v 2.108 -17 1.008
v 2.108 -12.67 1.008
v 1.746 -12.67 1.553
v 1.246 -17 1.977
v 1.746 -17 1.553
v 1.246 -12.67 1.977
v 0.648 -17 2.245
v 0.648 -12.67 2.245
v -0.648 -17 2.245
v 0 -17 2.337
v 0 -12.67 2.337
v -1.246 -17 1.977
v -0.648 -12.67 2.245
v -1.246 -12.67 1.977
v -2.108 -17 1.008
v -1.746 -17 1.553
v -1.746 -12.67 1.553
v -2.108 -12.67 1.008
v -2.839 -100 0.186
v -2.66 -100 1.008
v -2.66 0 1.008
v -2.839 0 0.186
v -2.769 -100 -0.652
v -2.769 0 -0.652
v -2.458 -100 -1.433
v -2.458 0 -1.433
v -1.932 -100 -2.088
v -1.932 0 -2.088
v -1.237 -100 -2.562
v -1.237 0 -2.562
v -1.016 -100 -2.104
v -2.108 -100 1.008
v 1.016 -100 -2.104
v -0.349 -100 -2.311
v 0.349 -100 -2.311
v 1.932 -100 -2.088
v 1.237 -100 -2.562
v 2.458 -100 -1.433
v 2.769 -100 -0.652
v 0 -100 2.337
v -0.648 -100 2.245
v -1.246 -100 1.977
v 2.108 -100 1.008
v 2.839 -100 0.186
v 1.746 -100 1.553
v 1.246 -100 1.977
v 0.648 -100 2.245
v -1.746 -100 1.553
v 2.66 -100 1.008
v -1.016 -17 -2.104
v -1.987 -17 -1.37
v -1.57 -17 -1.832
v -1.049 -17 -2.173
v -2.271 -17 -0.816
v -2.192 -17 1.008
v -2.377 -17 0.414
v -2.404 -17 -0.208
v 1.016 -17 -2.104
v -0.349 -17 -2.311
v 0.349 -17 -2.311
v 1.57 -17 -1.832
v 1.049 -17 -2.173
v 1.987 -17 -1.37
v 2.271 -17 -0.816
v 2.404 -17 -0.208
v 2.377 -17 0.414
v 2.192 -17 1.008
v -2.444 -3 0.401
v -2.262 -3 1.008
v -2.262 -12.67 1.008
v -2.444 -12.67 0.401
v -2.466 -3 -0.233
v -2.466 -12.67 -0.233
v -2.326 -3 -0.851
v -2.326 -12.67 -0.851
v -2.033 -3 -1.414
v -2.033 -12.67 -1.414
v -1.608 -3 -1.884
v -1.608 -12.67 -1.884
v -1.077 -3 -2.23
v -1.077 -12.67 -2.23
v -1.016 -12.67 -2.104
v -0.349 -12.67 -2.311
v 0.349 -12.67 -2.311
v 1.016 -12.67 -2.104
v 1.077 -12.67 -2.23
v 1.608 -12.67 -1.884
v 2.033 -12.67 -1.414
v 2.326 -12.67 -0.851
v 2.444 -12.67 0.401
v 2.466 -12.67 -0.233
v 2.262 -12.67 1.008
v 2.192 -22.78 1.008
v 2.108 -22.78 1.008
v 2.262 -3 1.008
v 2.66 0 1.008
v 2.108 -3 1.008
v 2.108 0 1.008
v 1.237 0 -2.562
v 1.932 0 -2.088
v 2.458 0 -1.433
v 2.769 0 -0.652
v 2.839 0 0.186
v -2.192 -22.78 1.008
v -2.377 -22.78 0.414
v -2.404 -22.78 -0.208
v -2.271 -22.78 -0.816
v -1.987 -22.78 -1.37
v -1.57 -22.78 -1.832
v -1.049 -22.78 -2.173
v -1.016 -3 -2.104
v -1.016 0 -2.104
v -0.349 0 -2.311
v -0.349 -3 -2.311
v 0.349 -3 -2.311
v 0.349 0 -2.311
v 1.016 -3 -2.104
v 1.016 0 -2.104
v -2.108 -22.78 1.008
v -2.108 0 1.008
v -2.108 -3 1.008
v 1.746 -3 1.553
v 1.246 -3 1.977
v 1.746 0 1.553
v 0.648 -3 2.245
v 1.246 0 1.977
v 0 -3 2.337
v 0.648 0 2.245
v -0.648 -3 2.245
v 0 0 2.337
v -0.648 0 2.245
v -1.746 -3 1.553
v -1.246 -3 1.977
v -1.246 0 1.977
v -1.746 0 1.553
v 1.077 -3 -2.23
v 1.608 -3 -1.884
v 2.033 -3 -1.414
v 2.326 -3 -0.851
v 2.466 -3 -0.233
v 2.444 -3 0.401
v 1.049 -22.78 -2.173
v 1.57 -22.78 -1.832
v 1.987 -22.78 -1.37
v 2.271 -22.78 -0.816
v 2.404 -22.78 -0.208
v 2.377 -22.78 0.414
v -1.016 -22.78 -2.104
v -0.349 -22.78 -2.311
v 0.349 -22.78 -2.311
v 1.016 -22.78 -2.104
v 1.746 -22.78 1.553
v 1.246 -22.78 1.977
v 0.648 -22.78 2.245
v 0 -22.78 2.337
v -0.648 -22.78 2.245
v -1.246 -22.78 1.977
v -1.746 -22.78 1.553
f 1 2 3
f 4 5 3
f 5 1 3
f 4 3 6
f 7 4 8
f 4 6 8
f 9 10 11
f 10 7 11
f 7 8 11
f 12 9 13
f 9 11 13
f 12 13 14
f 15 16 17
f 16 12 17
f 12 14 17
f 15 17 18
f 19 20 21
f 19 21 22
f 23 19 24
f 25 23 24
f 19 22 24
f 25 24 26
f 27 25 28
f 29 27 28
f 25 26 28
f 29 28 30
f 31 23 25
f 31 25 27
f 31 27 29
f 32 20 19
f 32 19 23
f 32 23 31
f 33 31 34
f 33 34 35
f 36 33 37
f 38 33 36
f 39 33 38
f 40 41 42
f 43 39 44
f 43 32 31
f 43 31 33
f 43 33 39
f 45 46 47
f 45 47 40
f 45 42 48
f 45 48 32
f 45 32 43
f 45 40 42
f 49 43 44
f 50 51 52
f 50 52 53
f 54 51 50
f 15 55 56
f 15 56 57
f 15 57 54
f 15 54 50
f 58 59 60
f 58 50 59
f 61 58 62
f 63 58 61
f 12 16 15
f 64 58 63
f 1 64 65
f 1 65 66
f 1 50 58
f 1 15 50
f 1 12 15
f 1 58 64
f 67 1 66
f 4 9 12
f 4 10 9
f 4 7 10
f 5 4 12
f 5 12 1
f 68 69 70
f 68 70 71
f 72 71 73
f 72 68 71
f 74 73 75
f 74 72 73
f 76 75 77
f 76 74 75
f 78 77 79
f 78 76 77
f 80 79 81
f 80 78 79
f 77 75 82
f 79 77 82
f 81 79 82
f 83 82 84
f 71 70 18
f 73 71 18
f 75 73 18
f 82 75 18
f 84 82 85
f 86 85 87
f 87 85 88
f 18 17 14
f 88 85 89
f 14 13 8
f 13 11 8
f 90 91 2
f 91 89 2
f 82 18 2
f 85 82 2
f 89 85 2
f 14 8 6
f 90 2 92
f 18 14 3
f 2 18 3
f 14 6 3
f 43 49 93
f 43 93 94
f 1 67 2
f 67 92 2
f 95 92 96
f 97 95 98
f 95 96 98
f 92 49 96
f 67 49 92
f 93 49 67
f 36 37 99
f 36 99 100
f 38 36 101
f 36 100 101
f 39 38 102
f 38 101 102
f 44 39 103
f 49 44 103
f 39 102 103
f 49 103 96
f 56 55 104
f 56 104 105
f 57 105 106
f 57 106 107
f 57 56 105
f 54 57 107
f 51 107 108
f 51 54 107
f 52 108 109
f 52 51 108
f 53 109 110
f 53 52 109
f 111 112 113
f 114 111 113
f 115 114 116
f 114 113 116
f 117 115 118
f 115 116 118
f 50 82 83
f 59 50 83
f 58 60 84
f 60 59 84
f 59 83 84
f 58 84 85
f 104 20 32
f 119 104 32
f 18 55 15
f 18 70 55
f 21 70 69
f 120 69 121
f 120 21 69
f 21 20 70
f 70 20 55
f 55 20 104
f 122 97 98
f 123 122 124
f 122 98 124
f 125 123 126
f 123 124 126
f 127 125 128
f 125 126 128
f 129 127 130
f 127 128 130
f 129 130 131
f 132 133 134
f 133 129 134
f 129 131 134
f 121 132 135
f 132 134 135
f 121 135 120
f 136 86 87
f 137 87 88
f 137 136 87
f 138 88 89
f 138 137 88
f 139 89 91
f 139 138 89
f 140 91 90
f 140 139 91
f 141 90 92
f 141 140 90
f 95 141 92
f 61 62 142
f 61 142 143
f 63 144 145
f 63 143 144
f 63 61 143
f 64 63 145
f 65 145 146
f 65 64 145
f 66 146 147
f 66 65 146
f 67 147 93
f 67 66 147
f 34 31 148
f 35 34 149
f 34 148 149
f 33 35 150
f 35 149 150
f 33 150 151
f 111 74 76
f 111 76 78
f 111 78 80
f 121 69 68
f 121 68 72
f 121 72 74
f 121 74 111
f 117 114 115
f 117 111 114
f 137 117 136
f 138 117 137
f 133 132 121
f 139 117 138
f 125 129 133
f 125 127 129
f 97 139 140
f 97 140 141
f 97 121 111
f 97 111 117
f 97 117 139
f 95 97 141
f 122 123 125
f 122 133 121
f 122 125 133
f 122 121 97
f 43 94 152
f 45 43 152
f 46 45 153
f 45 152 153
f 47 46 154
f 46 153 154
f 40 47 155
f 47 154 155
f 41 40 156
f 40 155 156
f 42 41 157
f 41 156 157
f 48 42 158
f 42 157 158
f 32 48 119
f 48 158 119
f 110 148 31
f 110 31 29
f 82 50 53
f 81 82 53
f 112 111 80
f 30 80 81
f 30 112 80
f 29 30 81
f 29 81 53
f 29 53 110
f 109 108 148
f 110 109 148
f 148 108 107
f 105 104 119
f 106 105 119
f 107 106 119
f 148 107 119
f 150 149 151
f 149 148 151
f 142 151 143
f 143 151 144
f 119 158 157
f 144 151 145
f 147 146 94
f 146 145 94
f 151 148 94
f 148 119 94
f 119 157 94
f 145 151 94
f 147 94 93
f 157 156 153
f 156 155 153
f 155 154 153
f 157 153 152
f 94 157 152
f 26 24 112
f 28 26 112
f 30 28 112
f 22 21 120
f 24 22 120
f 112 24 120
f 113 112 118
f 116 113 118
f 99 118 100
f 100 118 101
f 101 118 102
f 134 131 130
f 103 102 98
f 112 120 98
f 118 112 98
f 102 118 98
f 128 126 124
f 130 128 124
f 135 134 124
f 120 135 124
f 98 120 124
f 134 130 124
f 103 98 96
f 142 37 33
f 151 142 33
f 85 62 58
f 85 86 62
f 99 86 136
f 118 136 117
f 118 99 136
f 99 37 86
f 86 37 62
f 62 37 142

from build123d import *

# Parameters (mm, degrees)
CYLINDER001_R     = 2.413
CYLINDER001_DEPTH = 5.78
CYLINDER_R        = 2.4765
CYLINDER_DEPTH    = 9.67
PAD_DEPTH         = 100


with BuildPart() as cylinder001:
    # Cylinder001 → Cylinder001 (new body)
    with BuildSketch(Plane.XZ.offset(17)):
        Circle(CYLINDER001_R)
    extrude(amount=CYLINDER001_DEPTH)


with BuildPart() as cylinder:
    # Cylinder → Cylinder (new body)
    with BuildSketch(Plane.XZ.offset(3)):
        Circle(CYLINDER_R)
    extrude(amount=CYLINDER_DEPTH)


with BuildPart() as cut001:
    # Sketch → Pad (new body)
    with BuildSketch(Plane.XZ):
        with BuildLine():
            ThreePointArc((2.1082, 1.008031), (0, 2.3368), (-2.1082, 1.008031))
            Line((-2.660218, 1.008031), (-2.1082, 1.008031))
            ThreePointArc((-2.660218, 1.008031), (-2.642503, -1.053595), (-1.23687, -2.561843))
            Line((-1.016, -2.104371), (-1.23687, -2.561843))
            ThreePointArc((-1.016, -2.104371), (0, -2.3368), (1.016, -2.104371))
            Line((1.23687, -2.561843), (1.016, -2.104371))
            ThreePointArc((1.23687, -2.561843), (2.642503, -1.053595), (2.660218, 1.008031))
            Line((2.660218, 1.008031), (2.1082, 1.008031))
        make_face()
    extrude(amount=PAD_DEPTH)

    # Cut: cut Cylinder
    add(cylinder.part, mode=Mode.SUBTRACT)

    # Cut001: cut Cylinder001
    add(cylinder001.part, mode=Mode.SUBTRACT)


solid = cut001.part
